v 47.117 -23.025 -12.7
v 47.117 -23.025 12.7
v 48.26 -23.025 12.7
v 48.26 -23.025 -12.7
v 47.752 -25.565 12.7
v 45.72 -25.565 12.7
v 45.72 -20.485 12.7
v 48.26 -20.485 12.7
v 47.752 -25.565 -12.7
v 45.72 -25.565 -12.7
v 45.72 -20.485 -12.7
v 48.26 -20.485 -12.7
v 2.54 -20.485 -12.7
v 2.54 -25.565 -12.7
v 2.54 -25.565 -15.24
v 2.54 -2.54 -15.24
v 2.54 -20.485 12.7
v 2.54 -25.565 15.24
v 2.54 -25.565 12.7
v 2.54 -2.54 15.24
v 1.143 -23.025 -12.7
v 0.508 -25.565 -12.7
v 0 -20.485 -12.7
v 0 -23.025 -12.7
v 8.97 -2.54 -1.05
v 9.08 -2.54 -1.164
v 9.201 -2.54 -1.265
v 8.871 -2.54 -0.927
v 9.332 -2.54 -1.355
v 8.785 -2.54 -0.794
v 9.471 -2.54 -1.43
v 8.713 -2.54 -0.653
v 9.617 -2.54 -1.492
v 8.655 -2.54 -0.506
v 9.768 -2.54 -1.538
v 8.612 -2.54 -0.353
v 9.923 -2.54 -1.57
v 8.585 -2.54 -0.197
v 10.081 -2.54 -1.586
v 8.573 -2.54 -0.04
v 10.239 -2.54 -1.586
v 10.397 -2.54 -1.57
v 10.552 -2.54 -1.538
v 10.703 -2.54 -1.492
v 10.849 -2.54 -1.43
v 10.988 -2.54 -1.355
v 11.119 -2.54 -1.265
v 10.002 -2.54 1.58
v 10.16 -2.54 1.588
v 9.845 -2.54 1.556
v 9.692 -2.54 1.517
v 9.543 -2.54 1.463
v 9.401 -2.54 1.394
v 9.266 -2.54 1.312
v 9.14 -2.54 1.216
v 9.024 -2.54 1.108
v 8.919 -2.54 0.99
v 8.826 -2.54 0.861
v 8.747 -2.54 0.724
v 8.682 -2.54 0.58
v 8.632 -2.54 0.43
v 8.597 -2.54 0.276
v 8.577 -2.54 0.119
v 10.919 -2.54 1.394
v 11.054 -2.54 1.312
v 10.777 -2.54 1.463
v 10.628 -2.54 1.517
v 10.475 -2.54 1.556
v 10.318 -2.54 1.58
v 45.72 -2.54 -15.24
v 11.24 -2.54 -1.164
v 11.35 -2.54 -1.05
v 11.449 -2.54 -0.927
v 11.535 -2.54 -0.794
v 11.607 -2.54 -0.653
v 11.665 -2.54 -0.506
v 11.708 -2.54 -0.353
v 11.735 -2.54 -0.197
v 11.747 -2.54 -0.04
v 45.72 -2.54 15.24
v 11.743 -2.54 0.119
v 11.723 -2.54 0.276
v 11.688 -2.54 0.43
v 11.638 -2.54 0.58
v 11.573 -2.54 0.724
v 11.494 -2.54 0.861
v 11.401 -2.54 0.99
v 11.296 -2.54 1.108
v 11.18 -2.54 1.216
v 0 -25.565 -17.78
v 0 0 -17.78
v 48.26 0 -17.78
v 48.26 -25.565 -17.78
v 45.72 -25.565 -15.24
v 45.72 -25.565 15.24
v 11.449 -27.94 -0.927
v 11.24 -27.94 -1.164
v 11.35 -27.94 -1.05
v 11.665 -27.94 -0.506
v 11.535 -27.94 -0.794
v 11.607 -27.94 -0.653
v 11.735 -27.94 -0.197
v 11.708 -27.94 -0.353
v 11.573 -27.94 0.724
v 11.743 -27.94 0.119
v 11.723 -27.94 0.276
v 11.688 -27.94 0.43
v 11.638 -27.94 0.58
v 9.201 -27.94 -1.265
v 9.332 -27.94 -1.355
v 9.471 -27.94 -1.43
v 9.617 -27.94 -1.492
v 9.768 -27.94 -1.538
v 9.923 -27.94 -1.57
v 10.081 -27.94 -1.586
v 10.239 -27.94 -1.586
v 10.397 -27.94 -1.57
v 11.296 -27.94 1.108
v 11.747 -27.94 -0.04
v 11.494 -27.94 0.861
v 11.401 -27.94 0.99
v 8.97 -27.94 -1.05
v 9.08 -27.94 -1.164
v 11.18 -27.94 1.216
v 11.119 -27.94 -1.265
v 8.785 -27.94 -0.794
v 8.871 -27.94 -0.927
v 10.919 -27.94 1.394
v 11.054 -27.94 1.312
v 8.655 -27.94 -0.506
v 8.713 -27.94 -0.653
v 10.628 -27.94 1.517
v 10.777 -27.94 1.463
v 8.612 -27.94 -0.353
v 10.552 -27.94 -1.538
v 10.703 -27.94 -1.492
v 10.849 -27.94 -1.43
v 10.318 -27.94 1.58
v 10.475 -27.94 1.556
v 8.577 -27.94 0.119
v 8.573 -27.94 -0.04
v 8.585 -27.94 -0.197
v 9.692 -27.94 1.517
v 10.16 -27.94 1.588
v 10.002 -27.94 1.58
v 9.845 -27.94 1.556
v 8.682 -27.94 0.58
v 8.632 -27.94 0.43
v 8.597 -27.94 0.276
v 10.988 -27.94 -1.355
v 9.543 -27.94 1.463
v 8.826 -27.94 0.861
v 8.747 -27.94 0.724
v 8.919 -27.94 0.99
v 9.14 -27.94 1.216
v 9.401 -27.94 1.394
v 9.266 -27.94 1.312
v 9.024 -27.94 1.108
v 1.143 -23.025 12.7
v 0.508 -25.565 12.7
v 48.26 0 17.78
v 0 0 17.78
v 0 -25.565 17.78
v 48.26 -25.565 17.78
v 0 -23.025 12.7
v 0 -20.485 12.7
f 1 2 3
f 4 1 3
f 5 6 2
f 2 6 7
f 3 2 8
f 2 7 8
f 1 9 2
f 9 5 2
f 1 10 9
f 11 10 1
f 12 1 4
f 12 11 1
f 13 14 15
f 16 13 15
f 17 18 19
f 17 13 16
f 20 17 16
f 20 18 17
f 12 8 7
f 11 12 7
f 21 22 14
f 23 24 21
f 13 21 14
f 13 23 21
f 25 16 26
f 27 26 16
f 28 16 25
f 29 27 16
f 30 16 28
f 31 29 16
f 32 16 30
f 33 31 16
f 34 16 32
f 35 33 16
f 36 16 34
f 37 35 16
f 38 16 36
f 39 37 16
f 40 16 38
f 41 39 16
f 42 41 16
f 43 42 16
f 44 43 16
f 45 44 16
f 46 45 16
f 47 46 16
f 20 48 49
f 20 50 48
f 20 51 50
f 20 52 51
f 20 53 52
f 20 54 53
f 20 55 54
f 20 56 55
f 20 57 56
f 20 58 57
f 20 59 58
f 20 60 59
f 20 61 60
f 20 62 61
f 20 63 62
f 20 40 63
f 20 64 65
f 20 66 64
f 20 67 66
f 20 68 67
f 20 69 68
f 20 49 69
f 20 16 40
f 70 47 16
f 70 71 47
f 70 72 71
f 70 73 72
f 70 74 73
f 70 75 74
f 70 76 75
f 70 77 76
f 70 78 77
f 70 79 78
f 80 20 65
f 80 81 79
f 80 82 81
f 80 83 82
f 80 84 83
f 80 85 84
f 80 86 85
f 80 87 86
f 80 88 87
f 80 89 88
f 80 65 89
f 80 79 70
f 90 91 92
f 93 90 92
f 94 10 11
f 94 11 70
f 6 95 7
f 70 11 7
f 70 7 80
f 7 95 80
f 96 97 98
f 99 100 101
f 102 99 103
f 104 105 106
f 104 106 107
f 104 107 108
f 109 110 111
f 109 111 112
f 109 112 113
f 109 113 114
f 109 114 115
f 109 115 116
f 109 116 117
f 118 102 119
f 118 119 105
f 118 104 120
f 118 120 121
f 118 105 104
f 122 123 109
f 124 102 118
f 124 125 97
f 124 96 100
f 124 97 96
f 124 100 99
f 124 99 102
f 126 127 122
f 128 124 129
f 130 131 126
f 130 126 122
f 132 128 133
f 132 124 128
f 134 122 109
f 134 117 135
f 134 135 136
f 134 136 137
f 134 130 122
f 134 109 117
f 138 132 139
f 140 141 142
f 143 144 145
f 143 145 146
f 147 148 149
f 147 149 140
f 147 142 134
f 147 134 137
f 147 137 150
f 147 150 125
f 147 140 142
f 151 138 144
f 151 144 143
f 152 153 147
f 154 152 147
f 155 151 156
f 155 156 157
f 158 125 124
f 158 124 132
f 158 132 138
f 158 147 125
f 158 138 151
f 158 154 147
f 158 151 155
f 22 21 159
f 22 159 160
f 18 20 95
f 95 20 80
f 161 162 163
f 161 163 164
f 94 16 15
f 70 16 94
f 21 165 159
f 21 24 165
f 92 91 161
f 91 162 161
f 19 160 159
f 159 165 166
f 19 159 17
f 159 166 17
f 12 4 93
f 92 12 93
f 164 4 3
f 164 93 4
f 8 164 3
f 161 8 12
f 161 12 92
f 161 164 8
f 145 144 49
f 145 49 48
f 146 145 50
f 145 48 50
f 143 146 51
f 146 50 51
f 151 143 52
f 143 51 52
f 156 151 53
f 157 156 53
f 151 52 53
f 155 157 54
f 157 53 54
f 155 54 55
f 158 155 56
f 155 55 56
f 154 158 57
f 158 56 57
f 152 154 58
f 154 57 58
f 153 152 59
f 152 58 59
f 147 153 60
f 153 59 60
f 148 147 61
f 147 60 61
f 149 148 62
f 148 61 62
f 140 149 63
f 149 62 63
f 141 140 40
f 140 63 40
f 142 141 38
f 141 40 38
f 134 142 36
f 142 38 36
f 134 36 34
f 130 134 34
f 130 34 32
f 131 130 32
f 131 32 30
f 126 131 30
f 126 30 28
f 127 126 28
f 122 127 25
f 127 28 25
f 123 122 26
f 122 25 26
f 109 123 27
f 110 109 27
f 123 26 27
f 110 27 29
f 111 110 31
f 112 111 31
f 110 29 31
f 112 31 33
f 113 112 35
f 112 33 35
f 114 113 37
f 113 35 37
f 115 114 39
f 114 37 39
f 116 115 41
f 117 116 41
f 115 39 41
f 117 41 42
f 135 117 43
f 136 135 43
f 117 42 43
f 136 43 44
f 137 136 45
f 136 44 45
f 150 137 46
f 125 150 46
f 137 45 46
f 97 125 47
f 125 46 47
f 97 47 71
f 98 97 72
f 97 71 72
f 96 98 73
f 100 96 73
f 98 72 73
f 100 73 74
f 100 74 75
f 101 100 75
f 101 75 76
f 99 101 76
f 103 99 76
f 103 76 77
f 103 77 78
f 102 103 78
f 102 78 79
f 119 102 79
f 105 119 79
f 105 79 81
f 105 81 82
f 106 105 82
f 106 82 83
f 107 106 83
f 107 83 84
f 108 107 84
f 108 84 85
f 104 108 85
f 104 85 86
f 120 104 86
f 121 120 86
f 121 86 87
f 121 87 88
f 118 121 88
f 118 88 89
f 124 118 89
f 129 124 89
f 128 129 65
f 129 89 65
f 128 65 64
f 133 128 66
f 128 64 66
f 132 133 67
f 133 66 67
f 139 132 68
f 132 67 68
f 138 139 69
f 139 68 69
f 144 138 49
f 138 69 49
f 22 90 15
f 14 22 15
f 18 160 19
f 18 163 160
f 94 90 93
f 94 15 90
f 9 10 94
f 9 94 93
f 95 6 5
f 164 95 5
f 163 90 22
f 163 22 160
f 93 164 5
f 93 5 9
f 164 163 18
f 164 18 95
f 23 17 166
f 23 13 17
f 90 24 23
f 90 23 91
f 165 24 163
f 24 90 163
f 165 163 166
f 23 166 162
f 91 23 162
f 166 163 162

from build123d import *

# Parameters (mm, degrees)
SKETCH1_W           = 48.26
SKETCH1_H           = 25.5651
BOSS_EXTRUDE1_DEPTH = 17.78
SHELL1_T            = -2.54
SKETCH2_R           = 1.5875
BOSS_EXTRUDE2_DEPTH = 25.4
CUT_EXTRUDE1_DEPTH  = 12.7


with BuildPart() as part:
    # Sketch1 → Boss-Extrude1 (new, symmetric)
    with BuildSketch(Plane.XY):
        with Locations((24.13, -12.78255)):
            Rectangle(SKETCH1_W, SKETCH1_H)
    extrude(amount=BOSS_EXTRUDE1_DEPTH, both=True)

    # Shell1
    shell1_openings = [part.faces().sort_by_distance(p)[0] for p in [
        (24.13, -25.5651, 0),
    ]]
    offset(amount=SHELL1_T, openings=shell1_openings, kind=Kind.INTERSECTION)

    # Sketch2 → Boss-Extrude2 (add)
    with BuildSketch(Plane.XZ.offset(2.54)):
        with Locations(Location((10.16, 0, 0), (0, 0, 90))):
            Circle(SKETCH2_R)
    extrude(amount=BOSS_EXTRUDE2_DEPTH)

    # Sketch3 → Cut-Extrude1 (cut, symmetric)
    with BuildSketch(Plane.XY):
        Polygon((2.54, -25.5651), (2.54, -20.4851), (0, -20.4851), (0, -23.0251), (1.143, -23.0251), (0.508, -25.5651), align=None)
        Polygon((47.752, -25.5651), (47.117, -23.0251), (48.26, -23.0251), (48.26, -20.4851), (45.72, -20.4851), (45.72, -25.5651), align=None)
    extrude(amount=CUT_EXTRUDE1_DEPTH, both=True, mode=Mode.SUBTRACT)


solid = part.part
